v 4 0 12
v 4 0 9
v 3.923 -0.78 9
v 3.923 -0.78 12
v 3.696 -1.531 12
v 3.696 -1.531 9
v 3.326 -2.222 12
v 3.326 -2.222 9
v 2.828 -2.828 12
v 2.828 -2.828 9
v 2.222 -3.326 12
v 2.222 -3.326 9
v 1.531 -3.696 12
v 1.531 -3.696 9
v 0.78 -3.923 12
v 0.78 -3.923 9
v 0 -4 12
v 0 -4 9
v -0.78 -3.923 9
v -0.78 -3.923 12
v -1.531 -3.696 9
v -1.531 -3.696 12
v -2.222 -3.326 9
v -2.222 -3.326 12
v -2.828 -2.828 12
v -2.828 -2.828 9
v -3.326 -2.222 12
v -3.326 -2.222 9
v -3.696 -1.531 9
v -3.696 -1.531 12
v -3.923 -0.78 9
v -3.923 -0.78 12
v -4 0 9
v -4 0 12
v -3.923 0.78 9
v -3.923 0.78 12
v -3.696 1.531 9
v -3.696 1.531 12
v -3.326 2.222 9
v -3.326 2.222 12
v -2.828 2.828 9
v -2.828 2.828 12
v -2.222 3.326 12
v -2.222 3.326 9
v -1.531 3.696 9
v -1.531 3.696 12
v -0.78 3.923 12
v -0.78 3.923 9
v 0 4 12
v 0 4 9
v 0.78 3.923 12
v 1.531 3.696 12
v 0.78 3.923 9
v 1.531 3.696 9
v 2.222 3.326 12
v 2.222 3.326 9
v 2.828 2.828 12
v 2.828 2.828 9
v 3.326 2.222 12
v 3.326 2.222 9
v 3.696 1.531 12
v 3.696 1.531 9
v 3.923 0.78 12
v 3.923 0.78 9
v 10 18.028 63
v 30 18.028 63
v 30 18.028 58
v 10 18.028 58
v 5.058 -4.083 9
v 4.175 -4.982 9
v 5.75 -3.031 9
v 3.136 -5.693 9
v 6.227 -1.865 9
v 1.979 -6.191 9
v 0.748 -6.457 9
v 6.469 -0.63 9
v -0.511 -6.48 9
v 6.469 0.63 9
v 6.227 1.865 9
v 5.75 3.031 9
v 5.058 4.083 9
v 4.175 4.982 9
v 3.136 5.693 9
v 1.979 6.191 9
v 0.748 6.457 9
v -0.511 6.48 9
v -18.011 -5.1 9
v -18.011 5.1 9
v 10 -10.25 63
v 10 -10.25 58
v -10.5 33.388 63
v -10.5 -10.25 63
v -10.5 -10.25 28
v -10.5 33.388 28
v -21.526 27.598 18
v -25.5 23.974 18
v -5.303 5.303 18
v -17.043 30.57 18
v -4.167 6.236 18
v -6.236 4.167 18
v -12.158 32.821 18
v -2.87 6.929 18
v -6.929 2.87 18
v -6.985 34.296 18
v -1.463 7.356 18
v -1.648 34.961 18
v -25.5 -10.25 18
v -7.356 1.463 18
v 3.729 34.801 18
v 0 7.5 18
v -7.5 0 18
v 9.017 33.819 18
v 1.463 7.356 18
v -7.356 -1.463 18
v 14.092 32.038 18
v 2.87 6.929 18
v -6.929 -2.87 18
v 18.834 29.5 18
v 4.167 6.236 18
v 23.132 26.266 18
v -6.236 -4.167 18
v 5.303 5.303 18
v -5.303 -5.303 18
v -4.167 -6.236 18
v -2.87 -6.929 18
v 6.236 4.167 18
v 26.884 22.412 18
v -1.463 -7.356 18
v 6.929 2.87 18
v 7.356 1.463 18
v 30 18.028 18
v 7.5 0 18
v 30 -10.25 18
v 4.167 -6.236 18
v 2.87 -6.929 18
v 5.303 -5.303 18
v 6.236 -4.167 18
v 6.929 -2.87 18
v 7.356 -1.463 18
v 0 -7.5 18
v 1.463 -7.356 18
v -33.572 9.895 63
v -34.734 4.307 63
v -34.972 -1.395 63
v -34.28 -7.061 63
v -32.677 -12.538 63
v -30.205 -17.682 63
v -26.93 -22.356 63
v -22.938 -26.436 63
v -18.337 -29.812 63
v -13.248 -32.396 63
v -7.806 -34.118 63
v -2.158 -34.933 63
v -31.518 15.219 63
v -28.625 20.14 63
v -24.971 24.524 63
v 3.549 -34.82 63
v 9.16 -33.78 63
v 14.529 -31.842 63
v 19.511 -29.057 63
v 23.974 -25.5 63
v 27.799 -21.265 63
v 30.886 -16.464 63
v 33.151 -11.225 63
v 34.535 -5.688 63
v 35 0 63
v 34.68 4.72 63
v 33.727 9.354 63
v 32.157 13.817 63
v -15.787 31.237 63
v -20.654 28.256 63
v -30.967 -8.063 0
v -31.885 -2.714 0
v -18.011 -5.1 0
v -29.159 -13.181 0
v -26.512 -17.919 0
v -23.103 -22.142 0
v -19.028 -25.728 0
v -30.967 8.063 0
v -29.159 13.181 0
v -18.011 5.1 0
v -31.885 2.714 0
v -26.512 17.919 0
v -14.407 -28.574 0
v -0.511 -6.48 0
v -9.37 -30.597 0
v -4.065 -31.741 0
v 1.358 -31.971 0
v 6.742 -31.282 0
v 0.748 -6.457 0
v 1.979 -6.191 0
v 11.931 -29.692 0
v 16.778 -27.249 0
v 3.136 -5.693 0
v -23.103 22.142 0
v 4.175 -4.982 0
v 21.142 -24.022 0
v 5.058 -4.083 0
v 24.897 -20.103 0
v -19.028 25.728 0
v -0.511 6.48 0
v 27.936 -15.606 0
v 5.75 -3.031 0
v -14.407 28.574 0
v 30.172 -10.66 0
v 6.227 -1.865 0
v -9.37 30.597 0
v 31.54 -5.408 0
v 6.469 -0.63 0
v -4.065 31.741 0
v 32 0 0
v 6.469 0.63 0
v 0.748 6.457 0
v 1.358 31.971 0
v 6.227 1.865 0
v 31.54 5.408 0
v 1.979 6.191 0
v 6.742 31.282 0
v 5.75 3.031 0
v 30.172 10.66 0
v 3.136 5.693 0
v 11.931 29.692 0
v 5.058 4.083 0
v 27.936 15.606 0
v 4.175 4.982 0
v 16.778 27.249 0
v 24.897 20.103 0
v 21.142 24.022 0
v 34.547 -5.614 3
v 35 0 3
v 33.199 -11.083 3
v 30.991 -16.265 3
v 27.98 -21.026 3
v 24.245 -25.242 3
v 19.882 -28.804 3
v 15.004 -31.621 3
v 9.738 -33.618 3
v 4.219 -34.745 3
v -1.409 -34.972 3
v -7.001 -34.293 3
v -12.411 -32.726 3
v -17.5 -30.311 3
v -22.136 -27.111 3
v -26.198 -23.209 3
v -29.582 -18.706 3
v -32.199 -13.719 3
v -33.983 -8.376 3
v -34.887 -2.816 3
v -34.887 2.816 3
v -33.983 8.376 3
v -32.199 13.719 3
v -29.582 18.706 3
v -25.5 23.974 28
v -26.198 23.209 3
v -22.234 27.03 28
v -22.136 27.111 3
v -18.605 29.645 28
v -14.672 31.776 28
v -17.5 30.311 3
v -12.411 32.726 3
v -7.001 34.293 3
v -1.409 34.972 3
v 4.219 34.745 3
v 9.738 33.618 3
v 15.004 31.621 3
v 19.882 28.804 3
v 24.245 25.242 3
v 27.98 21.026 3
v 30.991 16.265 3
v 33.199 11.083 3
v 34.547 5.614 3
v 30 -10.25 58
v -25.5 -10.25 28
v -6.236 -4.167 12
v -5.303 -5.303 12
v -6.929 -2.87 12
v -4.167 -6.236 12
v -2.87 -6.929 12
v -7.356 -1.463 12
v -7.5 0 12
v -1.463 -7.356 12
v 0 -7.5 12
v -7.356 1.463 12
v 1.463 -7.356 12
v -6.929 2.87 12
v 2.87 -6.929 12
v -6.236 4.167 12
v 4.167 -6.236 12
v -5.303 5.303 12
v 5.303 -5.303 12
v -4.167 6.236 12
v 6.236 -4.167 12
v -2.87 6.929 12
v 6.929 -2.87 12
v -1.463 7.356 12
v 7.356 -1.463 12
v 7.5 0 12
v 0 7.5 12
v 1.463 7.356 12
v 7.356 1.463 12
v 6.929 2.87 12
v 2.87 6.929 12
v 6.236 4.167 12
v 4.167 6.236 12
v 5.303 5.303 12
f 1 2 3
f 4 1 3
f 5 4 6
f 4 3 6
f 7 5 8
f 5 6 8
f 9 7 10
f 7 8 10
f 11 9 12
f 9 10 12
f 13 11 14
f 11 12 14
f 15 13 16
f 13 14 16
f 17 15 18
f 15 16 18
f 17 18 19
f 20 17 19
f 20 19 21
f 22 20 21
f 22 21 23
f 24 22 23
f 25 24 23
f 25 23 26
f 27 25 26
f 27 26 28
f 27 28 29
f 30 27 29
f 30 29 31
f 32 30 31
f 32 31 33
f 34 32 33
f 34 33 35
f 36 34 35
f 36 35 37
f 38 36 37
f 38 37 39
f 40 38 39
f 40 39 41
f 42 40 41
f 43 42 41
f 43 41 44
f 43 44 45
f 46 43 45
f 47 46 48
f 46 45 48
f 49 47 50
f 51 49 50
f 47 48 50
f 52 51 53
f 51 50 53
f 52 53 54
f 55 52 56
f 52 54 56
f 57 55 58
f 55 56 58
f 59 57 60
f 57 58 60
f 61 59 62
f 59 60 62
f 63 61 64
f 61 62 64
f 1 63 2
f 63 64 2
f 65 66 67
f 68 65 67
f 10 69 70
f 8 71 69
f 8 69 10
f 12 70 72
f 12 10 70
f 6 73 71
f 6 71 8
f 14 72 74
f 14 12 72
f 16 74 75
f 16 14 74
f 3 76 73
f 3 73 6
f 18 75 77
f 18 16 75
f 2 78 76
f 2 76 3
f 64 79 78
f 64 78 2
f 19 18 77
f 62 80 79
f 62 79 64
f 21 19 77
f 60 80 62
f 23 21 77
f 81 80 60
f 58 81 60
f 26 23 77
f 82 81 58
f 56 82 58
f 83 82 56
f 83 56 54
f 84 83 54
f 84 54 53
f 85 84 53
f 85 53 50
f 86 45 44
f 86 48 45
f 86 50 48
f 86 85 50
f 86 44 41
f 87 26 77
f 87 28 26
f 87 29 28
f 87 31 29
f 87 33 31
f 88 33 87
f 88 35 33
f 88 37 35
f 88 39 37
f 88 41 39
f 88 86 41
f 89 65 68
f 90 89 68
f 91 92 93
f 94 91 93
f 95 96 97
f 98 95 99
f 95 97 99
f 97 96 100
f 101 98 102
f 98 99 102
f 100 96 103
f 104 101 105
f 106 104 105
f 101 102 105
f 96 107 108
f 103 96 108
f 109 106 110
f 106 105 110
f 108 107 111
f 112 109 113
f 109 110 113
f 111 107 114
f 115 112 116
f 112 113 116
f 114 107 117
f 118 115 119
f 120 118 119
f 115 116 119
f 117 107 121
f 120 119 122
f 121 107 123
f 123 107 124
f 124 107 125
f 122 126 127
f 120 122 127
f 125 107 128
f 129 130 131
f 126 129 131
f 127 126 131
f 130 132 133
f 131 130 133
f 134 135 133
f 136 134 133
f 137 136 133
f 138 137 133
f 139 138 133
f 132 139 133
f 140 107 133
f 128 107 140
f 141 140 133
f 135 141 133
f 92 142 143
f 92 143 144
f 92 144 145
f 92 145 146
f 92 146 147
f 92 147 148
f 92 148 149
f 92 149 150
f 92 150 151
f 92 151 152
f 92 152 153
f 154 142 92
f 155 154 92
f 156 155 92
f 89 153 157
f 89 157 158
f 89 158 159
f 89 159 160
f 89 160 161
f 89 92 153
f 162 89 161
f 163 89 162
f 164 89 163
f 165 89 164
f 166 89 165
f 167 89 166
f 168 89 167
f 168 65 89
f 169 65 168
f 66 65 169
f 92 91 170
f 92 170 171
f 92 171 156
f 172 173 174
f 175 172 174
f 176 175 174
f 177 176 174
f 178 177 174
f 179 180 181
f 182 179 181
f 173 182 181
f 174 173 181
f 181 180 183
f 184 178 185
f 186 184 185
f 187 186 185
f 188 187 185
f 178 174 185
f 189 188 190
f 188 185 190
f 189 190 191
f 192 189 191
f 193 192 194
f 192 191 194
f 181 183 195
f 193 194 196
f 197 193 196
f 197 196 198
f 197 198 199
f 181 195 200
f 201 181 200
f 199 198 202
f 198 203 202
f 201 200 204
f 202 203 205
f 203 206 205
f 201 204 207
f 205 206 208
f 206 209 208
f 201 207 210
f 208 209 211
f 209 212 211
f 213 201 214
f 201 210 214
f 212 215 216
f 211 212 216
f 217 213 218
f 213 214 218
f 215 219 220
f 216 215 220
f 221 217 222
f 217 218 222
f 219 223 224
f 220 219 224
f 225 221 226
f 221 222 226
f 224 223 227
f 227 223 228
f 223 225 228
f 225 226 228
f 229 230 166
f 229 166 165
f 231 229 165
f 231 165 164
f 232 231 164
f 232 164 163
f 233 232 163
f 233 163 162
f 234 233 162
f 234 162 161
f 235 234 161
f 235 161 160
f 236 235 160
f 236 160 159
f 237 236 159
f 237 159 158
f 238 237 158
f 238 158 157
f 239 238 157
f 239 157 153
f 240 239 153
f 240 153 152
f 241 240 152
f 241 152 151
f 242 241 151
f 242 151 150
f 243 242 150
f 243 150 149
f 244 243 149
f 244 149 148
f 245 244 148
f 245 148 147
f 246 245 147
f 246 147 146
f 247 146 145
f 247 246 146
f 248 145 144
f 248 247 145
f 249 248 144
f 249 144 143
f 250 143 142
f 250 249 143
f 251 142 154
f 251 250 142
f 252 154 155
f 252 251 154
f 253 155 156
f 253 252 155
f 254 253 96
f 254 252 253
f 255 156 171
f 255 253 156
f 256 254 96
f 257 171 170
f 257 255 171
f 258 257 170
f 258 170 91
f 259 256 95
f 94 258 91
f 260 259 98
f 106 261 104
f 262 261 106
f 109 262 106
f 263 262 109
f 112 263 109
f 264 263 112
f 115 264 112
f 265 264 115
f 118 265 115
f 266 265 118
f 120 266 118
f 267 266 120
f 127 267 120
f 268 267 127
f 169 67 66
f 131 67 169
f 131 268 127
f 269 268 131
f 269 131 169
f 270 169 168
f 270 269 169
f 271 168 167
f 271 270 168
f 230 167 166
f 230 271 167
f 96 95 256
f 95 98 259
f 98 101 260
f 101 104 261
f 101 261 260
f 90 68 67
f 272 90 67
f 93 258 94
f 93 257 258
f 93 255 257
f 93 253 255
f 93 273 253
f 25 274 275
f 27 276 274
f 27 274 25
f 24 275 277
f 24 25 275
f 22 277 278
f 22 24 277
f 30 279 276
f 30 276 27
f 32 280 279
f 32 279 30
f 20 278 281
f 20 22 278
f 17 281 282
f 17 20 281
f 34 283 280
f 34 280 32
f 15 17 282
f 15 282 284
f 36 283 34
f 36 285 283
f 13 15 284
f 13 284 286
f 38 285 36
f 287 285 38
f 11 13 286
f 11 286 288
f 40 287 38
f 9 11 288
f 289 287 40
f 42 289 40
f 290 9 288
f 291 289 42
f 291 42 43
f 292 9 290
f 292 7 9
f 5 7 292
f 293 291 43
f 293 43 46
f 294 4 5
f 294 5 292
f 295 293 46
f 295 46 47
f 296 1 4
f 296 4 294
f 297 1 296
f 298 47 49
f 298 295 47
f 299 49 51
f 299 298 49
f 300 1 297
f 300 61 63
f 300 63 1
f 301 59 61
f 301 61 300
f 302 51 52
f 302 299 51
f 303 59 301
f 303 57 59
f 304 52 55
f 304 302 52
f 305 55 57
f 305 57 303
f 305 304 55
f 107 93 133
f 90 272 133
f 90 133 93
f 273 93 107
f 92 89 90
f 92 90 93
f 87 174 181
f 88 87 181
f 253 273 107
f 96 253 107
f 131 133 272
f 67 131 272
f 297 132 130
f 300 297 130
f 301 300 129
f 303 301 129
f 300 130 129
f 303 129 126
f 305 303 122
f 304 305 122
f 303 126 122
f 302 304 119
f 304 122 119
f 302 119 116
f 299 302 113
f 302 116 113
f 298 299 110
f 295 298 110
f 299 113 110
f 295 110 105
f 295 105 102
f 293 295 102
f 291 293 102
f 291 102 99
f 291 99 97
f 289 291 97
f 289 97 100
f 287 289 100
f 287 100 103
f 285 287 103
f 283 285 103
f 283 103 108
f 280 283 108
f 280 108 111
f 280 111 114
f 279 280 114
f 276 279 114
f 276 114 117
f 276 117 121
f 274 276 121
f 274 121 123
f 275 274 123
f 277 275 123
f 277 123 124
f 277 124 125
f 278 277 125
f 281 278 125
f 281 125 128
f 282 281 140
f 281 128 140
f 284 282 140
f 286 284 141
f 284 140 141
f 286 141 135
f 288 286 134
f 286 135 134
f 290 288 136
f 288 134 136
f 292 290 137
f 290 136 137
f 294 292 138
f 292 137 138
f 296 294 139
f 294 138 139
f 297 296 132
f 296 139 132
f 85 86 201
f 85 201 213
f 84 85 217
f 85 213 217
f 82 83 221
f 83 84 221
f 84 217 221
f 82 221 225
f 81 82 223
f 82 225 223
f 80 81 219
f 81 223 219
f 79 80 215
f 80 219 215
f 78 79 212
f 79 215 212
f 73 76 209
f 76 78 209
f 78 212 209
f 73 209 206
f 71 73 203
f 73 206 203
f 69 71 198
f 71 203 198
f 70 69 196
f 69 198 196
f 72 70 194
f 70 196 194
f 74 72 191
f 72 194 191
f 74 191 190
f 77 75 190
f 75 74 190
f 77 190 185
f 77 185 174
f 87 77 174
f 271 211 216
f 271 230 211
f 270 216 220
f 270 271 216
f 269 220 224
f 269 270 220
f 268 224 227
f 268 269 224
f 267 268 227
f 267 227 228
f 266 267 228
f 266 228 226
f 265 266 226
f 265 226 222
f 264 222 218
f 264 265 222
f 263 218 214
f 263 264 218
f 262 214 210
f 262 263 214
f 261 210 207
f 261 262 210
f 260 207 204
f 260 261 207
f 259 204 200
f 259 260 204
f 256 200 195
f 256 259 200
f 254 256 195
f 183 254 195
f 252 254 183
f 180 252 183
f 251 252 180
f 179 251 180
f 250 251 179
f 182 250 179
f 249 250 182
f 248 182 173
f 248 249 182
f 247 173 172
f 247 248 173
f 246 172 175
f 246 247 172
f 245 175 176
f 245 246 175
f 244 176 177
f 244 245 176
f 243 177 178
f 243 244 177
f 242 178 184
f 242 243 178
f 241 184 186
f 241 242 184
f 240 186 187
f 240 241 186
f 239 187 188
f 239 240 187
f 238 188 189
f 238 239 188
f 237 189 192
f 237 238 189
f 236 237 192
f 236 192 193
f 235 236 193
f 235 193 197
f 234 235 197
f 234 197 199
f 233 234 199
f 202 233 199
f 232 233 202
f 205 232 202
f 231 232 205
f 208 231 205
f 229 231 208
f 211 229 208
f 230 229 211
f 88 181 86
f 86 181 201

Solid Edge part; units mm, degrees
sketch "Sketch1" plane through (0, 0, 0) normal (0, 0, 1) x (1, 0, 0)
  circle A0 centre (0, 0) radius 35
  dimension "D1" = 70
extrude "Protrusion1" add sketch "Sketch1" along normal blind 63
sketch "Sketch2" plane through (0, 0, 63) normal (0, 0, 1) x (1, 0, 0)
  line L0 (-10.5, 10.25) -> (30, 10.25)
  line L1 (30, 10.25) -> (30, -10.25)
  line L2 (30, -10.25) -> (-10.5, -10.25)
  line L3 (-10.5, -10.25) -> (-10.5, 10.25)
  dimension "D1" = 10.5
  dimension "D2" = 20.5
  dimension "D3" = 40.5
extrude "Extrusionsausschnitt_1" cut sketch "Sketch2" against normal blind 45
sketch "Sketch3" plane through (0, 0, 0) normal (0, 0, -1) x (1, 0, 0)
  circle A0 centre (0, 0) radius 6.5
  dimension "D1" = 13
extrude "Extrusionsausschnitt_4" cut sketch "Sketch3" against normal blind 9
sketch "Sketch4" plane through (0, 0, 0) normal (0, 0, -1) x (1, 0, 0)
  line L0 (-0.5109, 6.4799) -> (-18.0109, 5.1)
  line L1 (-18.0109, 5.1) -> (-18.0109, -5.1)
  line L2 (-18.0109, -5.1) -> (-0.5109, -6.4799)
  line L3 (-0.5109, -6.4799) -> (-0.5109, 6.4799)
  dimension "D1" = 10.2
  dimension "D2" = 17.5
extrude "Cutout1" cut sketch "Sketch4" against normal up to vertex (9 mm away)
sketch "Sketch5" plane through (0, 0, 63) normal (0, 0, 1) x (1, 0, 0)
  circle A0 centre (0, 0) radius 7.5
  dimension "D1" = 15
extrude "Extrusionsausschnitt_6" cut sketch "Sketch5" against normal blind 51
sketch "Sketch6" plane through (0, 0, 0) normal (0, 0, -1) x (1, 0, 0)
  circle A0 centre (0, 0) radius 4
extrude "Cutout2" cut sketch "Sketch6" against normal through all
sketch "Sketch7" plane through (9.75, 10.25, 41.5) normal (0, -1, 0) x (1, 0, 0)
  line L0 (20.25, -23.5) -> (20.25, 21.5)
  line L1 (20.25, 21.5) -> (-20.25, 21.5)
  line L2 (-20.25, 21.5) -> (-20.25, -23.5)
  line L3 (-20.25, -23.5) -> (20.25, -23.5)
extrude "Cutout3" cut sketch "Sketch7" against normal through all
sketch "Sketch8" plane through (9.75, -10.25, 41.5) normal (0, 1, 0) x (-1, 0, 0)
  line L0 (-20.25, 21.5) -> (-0.25, 21.5)
  line L1 (-0.25, 21.5) -> (-0.25, 16.5)
  line L2 (-0.25, 16.5) -> (-20.25, 16.5)
  line L3 (-20.25, 16.5) -> (-20.25, 21.5)
  dimension "D1" = 20
  dimension "D2" = 5
extrude "Protrusion2" add sketch "Sketch8" along normal up to vertex (28.2778 mm away)
sketch "Sketch9" plane through (-13, 4, 41.5) normal (0, -1, 0) x (0, 0, 1)
  line L0 (-13.5, 2.5) -> (-23.5, 2.5)
  line L1 (-23.5, 2.5) -> (-23.5, -2.5)
  line L2 (-13.5, -2.5) -> (-23.5, -2.5)
  line L3 (-13.5, 2.5) -> (-13.5, -2.5)
  dimension "D1" = 10
extrude "Cutout4" cut sketch "Sketch9" against normal through all
sketch "Sketch10" plane through (-13, 4, 25) normal (0, 1, 0) x (-1, 0, 0)
  line L0 (-2.5, 3) -> (12.5, 3)
  line L1 (12.5, 3) -> (12.5, -7)
  line L2 (12.5, -7) -> (-2.5, -7)
  line L3 (-2.5, -7) -> (-2.5, 3)
  dimension "D1" = 15
extrude "Cutout5" cut sketch "Sketch10" along normal through all and the other way up to vertex (14.25 mm away)
chamfer "Fase_1" distance 3 angle 45 1 edges at (-35, 0, 0)
